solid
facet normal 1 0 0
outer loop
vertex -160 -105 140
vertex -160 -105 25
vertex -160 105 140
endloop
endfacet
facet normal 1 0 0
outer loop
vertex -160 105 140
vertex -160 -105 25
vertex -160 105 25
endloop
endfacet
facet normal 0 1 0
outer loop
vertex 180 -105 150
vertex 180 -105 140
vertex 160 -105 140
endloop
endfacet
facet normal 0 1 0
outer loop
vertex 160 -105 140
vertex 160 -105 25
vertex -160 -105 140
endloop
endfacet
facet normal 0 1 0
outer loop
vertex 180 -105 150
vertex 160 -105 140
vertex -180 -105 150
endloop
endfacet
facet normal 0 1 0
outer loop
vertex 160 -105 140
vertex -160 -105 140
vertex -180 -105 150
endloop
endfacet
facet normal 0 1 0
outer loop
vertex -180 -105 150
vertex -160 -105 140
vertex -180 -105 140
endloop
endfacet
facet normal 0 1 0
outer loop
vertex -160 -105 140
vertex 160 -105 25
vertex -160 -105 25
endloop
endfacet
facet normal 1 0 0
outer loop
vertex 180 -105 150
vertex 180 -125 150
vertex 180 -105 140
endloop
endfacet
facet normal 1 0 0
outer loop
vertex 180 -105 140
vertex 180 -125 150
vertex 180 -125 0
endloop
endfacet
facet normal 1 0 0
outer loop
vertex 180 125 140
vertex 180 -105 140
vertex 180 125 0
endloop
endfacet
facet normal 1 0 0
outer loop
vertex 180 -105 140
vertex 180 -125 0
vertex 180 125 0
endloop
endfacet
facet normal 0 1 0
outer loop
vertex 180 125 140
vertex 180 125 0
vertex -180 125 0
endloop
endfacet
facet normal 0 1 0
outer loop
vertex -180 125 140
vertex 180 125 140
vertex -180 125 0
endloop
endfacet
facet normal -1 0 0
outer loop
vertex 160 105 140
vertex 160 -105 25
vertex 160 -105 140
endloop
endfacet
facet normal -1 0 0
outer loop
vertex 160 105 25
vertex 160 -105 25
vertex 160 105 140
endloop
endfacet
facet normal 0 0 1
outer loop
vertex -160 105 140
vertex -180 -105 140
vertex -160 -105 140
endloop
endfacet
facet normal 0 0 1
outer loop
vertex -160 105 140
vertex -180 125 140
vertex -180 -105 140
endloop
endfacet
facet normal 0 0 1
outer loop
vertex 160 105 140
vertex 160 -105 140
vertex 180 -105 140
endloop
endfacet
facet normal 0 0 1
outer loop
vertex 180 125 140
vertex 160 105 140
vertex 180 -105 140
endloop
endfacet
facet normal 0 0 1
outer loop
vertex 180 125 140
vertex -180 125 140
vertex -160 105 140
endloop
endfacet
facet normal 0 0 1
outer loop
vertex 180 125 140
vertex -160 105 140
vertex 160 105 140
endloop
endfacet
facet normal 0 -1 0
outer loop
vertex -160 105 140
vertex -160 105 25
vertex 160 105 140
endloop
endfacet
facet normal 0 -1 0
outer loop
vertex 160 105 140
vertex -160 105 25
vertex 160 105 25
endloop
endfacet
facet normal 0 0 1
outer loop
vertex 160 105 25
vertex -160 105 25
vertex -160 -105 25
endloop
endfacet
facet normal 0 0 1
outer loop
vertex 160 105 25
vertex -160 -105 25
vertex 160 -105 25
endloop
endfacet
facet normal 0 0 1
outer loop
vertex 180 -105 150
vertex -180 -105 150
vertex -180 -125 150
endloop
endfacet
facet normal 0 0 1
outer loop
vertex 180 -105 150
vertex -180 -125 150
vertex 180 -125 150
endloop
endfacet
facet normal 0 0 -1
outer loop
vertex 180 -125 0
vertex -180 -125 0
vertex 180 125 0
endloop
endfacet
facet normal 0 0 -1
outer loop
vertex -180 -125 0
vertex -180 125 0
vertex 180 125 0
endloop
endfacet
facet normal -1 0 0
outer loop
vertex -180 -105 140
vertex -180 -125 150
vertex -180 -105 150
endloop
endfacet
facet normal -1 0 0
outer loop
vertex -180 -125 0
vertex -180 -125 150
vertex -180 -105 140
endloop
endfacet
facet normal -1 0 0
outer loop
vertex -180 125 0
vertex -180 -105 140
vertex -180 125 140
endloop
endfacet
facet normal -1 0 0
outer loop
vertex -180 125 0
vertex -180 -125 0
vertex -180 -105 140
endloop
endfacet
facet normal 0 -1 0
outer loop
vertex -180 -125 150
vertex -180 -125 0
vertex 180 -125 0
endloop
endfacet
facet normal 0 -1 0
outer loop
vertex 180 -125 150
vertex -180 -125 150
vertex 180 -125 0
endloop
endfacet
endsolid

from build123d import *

# Parameters (mm, degrees)
F0_W     = 20
F0_H     = 20
F0_W_2   = 320
F1_DEPTH = 150
F0_H_2   = 210
F2_DEPTH = 140
F3_DEPTH = 25


with BuildPart() as f1:
    # F0 (on Top) → F1 (new body)
    with BuildSketch(Plane.XY):
        with Locations((-170, -115)):
            Rectangle(F0_W, F0_H)
        with Locations((0, -115)):
            Rectangle(F0_W_2, F0_H)
        with Locations((170, -115)):
            Rectangle(F0_W, F0_H)
    extrude(amount=F1_DEPTH)

    # F0 (on Top) → F2 (join)
    with BuildSketch(Plane.XY):
        with Locations((-170, 0)):
            Rectangle(F0_W, F0_H_2)
        with Locations((-170, 115)):
            Rectangle(F0_W, F0_H)
        with Locations((0, 115)):
            Rectangle(F0_W_2, F0_H)
        with Locations((170, 115)):
            Rectangle(F0_W, F0_H)
        with Locations((170, 0)):
            Rectangle(F0_W, F0_H_2)
    extrude(amount=F2_DEPTH)

    # F0 (on Top) → F3 (join)
    with BuildSketch(Plane.XY):
        Rectangle(F0_W_2, F0_H_2)
    extrude(amount=F3_DEPTH)


solid = f1.part
